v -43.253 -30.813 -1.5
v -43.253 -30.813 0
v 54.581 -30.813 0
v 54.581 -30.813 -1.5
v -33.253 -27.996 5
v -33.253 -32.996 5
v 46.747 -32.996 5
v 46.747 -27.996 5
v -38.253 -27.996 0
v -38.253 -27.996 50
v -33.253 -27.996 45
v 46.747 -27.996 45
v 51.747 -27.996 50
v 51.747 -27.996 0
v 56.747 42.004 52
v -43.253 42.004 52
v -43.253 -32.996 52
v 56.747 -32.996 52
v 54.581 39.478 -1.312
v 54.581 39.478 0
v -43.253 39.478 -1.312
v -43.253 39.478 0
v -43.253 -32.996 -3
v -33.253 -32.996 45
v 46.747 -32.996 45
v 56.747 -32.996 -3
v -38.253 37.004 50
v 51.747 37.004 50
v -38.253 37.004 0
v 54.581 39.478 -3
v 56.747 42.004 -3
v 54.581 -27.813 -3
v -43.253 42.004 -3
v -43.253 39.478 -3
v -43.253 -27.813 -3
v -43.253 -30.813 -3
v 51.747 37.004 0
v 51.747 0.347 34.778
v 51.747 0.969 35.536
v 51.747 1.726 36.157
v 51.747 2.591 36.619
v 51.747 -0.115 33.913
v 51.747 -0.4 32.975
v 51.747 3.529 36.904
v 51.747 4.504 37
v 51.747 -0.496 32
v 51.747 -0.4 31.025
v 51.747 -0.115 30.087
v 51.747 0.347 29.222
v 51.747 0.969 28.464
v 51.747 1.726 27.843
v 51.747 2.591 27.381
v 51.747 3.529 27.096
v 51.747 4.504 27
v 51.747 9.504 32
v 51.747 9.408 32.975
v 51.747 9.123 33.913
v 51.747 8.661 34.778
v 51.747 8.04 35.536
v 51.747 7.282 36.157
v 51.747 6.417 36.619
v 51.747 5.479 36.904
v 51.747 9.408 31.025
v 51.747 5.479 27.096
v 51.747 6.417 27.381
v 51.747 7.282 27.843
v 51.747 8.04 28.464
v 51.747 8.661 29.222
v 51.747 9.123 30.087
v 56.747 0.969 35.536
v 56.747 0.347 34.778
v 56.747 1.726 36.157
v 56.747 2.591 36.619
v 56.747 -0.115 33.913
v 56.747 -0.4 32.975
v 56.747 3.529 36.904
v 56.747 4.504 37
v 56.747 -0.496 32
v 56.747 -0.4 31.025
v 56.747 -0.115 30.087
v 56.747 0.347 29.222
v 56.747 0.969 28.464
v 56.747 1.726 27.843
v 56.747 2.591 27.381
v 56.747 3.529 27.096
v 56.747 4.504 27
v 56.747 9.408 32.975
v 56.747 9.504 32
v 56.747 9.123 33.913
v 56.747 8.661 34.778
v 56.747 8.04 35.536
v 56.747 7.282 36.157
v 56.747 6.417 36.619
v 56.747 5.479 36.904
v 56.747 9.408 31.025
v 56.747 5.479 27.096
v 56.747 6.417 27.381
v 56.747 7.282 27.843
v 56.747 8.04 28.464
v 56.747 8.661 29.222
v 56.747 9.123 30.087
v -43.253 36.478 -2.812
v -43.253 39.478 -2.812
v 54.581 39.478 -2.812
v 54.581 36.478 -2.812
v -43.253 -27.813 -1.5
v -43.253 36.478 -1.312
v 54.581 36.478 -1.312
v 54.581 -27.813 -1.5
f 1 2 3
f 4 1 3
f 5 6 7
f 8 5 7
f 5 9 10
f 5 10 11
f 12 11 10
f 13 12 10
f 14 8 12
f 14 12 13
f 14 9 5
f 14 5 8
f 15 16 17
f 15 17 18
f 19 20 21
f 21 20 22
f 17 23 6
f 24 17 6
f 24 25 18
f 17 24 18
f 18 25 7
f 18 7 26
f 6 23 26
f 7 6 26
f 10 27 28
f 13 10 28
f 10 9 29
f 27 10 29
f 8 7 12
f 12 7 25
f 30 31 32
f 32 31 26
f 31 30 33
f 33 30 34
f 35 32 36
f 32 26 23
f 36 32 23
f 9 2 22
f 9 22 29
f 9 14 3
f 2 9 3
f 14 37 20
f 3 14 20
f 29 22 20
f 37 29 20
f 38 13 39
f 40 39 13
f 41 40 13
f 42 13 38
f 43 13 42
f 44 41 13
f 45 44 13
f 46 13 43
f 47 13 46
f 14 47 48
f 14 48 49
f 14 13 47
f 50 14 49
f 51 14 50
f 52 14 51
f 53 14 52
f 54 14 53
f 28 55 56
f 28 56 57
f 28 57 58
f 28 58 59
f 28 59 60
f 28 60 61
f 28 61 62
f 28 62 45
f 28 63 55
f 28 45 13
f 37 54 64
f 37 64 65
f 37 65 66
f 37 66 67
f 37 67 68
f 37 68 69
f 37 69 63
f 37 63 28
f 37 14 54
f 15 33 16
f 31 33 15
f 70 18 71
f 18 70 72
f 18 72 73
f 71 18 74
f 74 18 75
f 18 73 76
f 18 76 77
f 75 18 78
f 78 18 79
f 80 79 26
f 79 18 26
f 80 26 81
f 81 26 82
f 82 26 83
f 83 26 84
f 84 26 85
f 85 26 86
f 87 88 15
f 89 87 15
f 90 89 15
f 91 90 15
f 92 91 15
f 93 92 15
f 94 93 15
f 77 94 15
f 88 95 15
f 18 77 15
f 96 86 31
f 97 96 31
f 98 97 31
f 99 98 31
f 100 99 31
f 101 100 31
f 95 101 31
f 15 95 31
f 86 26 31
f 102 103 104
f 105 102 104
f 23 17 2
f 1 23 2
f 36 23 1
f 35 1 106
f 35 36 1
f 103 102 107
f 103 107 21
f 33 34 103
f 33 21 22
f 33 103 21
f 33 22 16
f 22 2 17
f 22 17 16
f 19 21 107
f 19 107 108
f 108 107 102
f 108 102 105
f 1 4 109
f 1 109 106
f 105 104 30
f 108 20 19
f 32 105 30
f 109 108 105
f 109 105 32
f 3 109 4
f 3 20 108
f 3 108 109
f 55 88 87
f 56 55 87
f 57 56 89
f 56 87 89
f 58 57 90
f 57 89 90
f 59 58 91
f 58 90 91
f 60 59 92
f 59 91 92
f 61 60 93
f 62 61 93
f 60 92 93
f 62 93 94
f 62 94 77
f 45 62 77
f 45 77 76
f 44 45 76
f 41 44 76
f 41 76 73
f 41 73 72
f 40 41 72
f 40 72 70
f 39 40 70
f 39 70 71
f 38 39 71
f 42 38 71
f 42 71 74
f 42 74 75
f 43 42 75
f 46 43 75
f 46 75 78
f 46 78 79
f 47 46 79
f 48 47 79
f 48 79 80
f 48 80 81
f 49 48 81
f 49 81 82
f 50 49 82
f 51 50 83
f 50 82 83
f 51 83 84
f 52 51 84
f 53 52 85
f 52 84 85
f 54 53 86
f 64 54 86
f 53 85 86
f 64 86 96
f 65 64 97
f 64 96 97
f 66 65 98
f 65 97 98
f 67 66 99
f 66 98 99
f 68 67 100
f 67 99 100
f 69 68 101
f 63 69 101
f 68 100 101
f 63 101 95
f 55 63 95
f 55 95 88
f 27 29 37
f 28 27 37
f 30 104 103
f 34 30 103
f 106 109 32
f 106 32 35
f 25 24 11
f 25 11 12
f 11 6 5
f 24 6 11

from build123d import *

# Parameters (mm, degrees)
F0_W      = 100
F0_H      = 75
F0_W_2    = 90
F0_H_2    = 65
F1_DEPTH  = 50
F2_W      = 2.1659184247
F2_H      = 70.2909231186
F3_DEPTH  = 3
F5_W      = 97.8340815753
F5_H      = 1.5
F6_DEPTH  = 3
F7_W      = 97.8340815753
F7_H      = 1.5
F8_DEPTH  = 3
F9_W      = 100
F9_H      = 75
F9_W_2    = 90
F9_H_2    = 65
F10_DEPTH = 2
F11_W     = 80
F11_H     = 40
F12_DEPTH = 25
F13_R     = 5
F14_DEPTH = 25


with BuildPart() as f1:
    # F0 (on Top) → F1 (new body)
    with BuildSketch(Plane.XY):
        with Locations((6.7471247166, 4.5040409956)):
            Rectangle(F0_W, F0_H)
        with Locations((6.7471247166, 4.5040409956)):
            Rectangle(F0_W_2, F0_H_2, mode=Mode.SUBTRACT)
    extrude(amount=F1_DEPTH)

    # F2 (on face) → F3 (join)
    with BuildSketch(Plane(origin=(0, 0, 0), x_dir=(1, 0, 0), z_dir=(0, 0, -1))):
        Polygon((56.7471247166, 32.9959590044), (-43.2528752834, 32.9959590044), (-43.2528752834, 30.8131203055), (54.5812062919, 30.8131203055), (56.7471247166, 30.8131203055), align=None)
        with Locations((55.6641655043, -4.3323412538)):
            Rectangle(F2_W, F2_H)
        Polygon((54.5812062919, -39.4778028131), (-43.2528752834, -39.4778028131), (-43.2528752834, -42.0040409956), (56.7471247166, -42.0040409956), (56.7471247166, -39.4778028131), align=None)
    extrude(amount=F3_DEPTH)

    # F5 (on face) → F6 (join)
    with BuildSketch(Plane(origin=(0, -30.8131203055, 0), x_dir=(-1, 0, 0), z_dir=(0, 1, 0))):
        with Locations((-5.6641655043, -2.25)):
            Rectangle(F5_W, F5_H)
    extrude(amount=F6_DEPTH)

    # F7 (on face) → F8 (join)
    with BuildSketch(Plane.XZ.offset(-39.4778028131)):
        with Locations((5.6641655043, -2.0621294)):
            Rectangle(F7_W, F7_H)
    extrude(amount=F8_DEPTH)

    # F9 (on face) → F10 (join)
    with BuildSketch(Plane.XY.offset(50)):
        with Locations((6.7471247166, 4.5040409956)):
            Rectangle(F9_W, F9_H)
        with Locations((6.7471247166, 4.5040409956)):
            Rectangle(F9_W_2, F9_H_2, mode=Mode.SUBTRACT)
        with Locations((6.7471247166, 4.5040409956)):
            Rectangle(F9_W_2, F9_H_2)
    extrude(amount=F10_DEPTH)

    # F11 (on face) → F12 (cut)
    with BuildSketch(Plane.XZ.offset(32.9959590044)):
        with Locations((6.7471247166, 25)):
            Rectangle(F11_W, F11_H)
    extrude(amount=-F12_DEPTH, mode=Mode.SUBTRACT)

    # F13 (on face) → F14 (cut)
    with BuildSketch(Plane.YZ.offset(56.7471247166)):
        with Locations((4.5040409956, 32)):
            Circle(F13_R)
    extrude(amount=-F14_DEPTH, mode=Mode.SUBTRACT)


solid = f1.part
